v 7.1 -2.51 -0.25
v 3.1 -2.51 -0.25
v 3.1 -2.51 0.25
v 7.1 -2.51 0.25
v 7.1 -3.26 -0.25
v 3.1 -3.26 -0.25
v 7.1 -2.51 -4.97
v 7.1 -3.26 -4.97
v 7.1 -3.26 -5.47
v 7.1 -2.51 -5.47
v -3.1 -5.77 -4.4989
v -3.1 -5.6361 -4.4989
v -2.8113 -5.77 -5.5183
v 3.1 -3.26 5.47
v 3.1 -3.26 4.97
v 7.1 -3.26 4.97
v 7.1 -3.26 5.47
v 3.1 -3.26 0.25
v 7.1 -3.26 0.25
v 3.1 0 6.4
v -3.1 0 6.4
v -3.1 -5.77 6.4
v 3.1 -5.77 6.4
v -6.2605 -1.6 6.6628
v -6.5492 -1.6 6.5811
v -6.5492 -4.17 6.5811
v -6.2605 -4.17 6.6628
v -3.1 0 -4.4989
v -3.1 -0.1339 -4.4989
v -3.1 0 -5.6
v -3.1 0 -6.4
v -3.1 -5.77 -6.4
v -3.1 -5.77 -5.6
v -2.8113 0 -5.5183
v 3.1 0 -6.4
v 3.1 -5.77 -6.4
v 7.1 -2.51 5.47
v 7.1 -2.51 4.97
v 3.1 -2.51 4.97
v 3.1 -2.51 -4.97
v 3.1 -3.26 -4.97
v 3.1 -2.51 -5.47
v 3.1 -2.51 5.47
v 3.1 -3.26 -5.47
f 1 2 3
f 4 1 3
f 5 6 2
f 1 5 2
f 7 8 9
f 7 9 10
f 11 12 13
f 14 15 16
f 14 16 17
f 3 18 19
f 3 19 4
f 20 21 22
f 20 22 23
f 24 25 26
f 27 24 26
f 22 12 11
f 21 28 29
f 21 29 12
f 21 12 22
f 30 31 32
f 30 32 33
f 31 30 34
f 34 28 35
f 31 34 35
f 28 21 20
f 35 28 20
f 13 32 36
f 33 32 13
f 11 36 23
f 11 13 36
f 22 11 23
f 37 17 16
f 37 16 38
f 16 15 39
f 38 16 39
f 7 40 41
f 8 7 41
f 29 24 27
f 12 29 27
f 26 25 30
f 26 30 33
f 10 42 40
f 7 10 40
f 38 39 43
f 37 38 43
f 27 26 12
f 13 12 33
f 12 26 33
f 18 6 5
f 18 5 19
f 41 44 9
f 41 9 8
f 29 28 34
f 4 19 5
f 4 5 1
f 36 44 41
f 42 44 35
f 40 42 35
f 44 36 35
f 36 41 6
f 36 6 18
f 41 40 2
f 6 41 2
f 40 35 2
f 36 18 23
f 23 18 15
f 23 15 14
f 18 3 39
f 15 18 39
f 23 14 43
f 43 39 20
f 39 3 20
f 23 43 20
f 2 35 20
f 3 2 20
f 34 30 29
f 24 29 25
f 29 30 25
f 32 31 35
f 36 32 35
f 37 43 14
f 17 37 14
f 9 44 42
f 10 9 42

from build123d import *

# Parameters (mm, degrees)
F0_W     = 6.2
F0_H     = 12.8
F1_DEPTH = 5.77
F2_W     = 0.375
F2_H     = 0.5
F2_W_2   = 0.75
F3_DEPTH = 4
F6_W     = 5.77
F6_H     = 12.66
F7_DEPTH = 0.3
F9_DEPTH = 0.3


# Not quite as in the source:
# - the program builds the solid bodies; features that only make, move or delete a surface that nothing else refers to are left out


with BuildPart() as f1:
    # F0 (on Front) → F1 (new body)
    with BuildSketch(Plane.XZ):
        Rectangle(F0_W, F0_H)
    extrude(amount=F1_DEPTH)

    # F2 (on face) → F3 (join)
    with BuildSketch(Plane.YZ.offset(3.1)):
        with Locations((-2.6975, 5.22)):
            Rectangle(F2_W, F2_H)
        with Locations((-3.0725, 5.22)):
            Rectangle(F2_W, F2_H)
        with Locations((-2.885, 0)):
            Rectangle(F2_W_2, F2_H)
        with Locations((-3.0725, -5.22)):
            Rectangle(F2_W, F2_H)
        with Locations((-2.6975, -5.22)):
            Rectangle(F2_W, F2_H)
    extrude(amount=F3_DEPTH)

    # F6 (on face) → F7 (join)
    with BuildSketch(Plane(origin=(-4.3378860758, 0, -1.2283157987), x_dir=(0, -1, 0), z_dir=(-0.962170457, 0, -0.2724481816))):
        with Locations((2.885, 1.7864348038)):
            Rectangle(F6_W, F6_H)
    extrude(amount=-F7_DEPTH)

    # F8 (on face) → F9 (cut, through all)
    with BuildSketch(Plane(origin=(-4.3378860758, 0, -1.2283157987), x_dir=(0, -1, 0), z_dir=(-0.962170457, 0, -0.2724481816))):
        Polygon((0, -4.5435651962), (1.6, 8.1164348038), (0, 8.1164348038), align=None)
        Polygon((4.17, 8.1164348038), (5.77, -4.5435651962), (5.77, 8.1164348038), align=None)
    extrude(amount=-F9_DEPTH, mode=Mode.SUBTRACT)


solid = f1.part
